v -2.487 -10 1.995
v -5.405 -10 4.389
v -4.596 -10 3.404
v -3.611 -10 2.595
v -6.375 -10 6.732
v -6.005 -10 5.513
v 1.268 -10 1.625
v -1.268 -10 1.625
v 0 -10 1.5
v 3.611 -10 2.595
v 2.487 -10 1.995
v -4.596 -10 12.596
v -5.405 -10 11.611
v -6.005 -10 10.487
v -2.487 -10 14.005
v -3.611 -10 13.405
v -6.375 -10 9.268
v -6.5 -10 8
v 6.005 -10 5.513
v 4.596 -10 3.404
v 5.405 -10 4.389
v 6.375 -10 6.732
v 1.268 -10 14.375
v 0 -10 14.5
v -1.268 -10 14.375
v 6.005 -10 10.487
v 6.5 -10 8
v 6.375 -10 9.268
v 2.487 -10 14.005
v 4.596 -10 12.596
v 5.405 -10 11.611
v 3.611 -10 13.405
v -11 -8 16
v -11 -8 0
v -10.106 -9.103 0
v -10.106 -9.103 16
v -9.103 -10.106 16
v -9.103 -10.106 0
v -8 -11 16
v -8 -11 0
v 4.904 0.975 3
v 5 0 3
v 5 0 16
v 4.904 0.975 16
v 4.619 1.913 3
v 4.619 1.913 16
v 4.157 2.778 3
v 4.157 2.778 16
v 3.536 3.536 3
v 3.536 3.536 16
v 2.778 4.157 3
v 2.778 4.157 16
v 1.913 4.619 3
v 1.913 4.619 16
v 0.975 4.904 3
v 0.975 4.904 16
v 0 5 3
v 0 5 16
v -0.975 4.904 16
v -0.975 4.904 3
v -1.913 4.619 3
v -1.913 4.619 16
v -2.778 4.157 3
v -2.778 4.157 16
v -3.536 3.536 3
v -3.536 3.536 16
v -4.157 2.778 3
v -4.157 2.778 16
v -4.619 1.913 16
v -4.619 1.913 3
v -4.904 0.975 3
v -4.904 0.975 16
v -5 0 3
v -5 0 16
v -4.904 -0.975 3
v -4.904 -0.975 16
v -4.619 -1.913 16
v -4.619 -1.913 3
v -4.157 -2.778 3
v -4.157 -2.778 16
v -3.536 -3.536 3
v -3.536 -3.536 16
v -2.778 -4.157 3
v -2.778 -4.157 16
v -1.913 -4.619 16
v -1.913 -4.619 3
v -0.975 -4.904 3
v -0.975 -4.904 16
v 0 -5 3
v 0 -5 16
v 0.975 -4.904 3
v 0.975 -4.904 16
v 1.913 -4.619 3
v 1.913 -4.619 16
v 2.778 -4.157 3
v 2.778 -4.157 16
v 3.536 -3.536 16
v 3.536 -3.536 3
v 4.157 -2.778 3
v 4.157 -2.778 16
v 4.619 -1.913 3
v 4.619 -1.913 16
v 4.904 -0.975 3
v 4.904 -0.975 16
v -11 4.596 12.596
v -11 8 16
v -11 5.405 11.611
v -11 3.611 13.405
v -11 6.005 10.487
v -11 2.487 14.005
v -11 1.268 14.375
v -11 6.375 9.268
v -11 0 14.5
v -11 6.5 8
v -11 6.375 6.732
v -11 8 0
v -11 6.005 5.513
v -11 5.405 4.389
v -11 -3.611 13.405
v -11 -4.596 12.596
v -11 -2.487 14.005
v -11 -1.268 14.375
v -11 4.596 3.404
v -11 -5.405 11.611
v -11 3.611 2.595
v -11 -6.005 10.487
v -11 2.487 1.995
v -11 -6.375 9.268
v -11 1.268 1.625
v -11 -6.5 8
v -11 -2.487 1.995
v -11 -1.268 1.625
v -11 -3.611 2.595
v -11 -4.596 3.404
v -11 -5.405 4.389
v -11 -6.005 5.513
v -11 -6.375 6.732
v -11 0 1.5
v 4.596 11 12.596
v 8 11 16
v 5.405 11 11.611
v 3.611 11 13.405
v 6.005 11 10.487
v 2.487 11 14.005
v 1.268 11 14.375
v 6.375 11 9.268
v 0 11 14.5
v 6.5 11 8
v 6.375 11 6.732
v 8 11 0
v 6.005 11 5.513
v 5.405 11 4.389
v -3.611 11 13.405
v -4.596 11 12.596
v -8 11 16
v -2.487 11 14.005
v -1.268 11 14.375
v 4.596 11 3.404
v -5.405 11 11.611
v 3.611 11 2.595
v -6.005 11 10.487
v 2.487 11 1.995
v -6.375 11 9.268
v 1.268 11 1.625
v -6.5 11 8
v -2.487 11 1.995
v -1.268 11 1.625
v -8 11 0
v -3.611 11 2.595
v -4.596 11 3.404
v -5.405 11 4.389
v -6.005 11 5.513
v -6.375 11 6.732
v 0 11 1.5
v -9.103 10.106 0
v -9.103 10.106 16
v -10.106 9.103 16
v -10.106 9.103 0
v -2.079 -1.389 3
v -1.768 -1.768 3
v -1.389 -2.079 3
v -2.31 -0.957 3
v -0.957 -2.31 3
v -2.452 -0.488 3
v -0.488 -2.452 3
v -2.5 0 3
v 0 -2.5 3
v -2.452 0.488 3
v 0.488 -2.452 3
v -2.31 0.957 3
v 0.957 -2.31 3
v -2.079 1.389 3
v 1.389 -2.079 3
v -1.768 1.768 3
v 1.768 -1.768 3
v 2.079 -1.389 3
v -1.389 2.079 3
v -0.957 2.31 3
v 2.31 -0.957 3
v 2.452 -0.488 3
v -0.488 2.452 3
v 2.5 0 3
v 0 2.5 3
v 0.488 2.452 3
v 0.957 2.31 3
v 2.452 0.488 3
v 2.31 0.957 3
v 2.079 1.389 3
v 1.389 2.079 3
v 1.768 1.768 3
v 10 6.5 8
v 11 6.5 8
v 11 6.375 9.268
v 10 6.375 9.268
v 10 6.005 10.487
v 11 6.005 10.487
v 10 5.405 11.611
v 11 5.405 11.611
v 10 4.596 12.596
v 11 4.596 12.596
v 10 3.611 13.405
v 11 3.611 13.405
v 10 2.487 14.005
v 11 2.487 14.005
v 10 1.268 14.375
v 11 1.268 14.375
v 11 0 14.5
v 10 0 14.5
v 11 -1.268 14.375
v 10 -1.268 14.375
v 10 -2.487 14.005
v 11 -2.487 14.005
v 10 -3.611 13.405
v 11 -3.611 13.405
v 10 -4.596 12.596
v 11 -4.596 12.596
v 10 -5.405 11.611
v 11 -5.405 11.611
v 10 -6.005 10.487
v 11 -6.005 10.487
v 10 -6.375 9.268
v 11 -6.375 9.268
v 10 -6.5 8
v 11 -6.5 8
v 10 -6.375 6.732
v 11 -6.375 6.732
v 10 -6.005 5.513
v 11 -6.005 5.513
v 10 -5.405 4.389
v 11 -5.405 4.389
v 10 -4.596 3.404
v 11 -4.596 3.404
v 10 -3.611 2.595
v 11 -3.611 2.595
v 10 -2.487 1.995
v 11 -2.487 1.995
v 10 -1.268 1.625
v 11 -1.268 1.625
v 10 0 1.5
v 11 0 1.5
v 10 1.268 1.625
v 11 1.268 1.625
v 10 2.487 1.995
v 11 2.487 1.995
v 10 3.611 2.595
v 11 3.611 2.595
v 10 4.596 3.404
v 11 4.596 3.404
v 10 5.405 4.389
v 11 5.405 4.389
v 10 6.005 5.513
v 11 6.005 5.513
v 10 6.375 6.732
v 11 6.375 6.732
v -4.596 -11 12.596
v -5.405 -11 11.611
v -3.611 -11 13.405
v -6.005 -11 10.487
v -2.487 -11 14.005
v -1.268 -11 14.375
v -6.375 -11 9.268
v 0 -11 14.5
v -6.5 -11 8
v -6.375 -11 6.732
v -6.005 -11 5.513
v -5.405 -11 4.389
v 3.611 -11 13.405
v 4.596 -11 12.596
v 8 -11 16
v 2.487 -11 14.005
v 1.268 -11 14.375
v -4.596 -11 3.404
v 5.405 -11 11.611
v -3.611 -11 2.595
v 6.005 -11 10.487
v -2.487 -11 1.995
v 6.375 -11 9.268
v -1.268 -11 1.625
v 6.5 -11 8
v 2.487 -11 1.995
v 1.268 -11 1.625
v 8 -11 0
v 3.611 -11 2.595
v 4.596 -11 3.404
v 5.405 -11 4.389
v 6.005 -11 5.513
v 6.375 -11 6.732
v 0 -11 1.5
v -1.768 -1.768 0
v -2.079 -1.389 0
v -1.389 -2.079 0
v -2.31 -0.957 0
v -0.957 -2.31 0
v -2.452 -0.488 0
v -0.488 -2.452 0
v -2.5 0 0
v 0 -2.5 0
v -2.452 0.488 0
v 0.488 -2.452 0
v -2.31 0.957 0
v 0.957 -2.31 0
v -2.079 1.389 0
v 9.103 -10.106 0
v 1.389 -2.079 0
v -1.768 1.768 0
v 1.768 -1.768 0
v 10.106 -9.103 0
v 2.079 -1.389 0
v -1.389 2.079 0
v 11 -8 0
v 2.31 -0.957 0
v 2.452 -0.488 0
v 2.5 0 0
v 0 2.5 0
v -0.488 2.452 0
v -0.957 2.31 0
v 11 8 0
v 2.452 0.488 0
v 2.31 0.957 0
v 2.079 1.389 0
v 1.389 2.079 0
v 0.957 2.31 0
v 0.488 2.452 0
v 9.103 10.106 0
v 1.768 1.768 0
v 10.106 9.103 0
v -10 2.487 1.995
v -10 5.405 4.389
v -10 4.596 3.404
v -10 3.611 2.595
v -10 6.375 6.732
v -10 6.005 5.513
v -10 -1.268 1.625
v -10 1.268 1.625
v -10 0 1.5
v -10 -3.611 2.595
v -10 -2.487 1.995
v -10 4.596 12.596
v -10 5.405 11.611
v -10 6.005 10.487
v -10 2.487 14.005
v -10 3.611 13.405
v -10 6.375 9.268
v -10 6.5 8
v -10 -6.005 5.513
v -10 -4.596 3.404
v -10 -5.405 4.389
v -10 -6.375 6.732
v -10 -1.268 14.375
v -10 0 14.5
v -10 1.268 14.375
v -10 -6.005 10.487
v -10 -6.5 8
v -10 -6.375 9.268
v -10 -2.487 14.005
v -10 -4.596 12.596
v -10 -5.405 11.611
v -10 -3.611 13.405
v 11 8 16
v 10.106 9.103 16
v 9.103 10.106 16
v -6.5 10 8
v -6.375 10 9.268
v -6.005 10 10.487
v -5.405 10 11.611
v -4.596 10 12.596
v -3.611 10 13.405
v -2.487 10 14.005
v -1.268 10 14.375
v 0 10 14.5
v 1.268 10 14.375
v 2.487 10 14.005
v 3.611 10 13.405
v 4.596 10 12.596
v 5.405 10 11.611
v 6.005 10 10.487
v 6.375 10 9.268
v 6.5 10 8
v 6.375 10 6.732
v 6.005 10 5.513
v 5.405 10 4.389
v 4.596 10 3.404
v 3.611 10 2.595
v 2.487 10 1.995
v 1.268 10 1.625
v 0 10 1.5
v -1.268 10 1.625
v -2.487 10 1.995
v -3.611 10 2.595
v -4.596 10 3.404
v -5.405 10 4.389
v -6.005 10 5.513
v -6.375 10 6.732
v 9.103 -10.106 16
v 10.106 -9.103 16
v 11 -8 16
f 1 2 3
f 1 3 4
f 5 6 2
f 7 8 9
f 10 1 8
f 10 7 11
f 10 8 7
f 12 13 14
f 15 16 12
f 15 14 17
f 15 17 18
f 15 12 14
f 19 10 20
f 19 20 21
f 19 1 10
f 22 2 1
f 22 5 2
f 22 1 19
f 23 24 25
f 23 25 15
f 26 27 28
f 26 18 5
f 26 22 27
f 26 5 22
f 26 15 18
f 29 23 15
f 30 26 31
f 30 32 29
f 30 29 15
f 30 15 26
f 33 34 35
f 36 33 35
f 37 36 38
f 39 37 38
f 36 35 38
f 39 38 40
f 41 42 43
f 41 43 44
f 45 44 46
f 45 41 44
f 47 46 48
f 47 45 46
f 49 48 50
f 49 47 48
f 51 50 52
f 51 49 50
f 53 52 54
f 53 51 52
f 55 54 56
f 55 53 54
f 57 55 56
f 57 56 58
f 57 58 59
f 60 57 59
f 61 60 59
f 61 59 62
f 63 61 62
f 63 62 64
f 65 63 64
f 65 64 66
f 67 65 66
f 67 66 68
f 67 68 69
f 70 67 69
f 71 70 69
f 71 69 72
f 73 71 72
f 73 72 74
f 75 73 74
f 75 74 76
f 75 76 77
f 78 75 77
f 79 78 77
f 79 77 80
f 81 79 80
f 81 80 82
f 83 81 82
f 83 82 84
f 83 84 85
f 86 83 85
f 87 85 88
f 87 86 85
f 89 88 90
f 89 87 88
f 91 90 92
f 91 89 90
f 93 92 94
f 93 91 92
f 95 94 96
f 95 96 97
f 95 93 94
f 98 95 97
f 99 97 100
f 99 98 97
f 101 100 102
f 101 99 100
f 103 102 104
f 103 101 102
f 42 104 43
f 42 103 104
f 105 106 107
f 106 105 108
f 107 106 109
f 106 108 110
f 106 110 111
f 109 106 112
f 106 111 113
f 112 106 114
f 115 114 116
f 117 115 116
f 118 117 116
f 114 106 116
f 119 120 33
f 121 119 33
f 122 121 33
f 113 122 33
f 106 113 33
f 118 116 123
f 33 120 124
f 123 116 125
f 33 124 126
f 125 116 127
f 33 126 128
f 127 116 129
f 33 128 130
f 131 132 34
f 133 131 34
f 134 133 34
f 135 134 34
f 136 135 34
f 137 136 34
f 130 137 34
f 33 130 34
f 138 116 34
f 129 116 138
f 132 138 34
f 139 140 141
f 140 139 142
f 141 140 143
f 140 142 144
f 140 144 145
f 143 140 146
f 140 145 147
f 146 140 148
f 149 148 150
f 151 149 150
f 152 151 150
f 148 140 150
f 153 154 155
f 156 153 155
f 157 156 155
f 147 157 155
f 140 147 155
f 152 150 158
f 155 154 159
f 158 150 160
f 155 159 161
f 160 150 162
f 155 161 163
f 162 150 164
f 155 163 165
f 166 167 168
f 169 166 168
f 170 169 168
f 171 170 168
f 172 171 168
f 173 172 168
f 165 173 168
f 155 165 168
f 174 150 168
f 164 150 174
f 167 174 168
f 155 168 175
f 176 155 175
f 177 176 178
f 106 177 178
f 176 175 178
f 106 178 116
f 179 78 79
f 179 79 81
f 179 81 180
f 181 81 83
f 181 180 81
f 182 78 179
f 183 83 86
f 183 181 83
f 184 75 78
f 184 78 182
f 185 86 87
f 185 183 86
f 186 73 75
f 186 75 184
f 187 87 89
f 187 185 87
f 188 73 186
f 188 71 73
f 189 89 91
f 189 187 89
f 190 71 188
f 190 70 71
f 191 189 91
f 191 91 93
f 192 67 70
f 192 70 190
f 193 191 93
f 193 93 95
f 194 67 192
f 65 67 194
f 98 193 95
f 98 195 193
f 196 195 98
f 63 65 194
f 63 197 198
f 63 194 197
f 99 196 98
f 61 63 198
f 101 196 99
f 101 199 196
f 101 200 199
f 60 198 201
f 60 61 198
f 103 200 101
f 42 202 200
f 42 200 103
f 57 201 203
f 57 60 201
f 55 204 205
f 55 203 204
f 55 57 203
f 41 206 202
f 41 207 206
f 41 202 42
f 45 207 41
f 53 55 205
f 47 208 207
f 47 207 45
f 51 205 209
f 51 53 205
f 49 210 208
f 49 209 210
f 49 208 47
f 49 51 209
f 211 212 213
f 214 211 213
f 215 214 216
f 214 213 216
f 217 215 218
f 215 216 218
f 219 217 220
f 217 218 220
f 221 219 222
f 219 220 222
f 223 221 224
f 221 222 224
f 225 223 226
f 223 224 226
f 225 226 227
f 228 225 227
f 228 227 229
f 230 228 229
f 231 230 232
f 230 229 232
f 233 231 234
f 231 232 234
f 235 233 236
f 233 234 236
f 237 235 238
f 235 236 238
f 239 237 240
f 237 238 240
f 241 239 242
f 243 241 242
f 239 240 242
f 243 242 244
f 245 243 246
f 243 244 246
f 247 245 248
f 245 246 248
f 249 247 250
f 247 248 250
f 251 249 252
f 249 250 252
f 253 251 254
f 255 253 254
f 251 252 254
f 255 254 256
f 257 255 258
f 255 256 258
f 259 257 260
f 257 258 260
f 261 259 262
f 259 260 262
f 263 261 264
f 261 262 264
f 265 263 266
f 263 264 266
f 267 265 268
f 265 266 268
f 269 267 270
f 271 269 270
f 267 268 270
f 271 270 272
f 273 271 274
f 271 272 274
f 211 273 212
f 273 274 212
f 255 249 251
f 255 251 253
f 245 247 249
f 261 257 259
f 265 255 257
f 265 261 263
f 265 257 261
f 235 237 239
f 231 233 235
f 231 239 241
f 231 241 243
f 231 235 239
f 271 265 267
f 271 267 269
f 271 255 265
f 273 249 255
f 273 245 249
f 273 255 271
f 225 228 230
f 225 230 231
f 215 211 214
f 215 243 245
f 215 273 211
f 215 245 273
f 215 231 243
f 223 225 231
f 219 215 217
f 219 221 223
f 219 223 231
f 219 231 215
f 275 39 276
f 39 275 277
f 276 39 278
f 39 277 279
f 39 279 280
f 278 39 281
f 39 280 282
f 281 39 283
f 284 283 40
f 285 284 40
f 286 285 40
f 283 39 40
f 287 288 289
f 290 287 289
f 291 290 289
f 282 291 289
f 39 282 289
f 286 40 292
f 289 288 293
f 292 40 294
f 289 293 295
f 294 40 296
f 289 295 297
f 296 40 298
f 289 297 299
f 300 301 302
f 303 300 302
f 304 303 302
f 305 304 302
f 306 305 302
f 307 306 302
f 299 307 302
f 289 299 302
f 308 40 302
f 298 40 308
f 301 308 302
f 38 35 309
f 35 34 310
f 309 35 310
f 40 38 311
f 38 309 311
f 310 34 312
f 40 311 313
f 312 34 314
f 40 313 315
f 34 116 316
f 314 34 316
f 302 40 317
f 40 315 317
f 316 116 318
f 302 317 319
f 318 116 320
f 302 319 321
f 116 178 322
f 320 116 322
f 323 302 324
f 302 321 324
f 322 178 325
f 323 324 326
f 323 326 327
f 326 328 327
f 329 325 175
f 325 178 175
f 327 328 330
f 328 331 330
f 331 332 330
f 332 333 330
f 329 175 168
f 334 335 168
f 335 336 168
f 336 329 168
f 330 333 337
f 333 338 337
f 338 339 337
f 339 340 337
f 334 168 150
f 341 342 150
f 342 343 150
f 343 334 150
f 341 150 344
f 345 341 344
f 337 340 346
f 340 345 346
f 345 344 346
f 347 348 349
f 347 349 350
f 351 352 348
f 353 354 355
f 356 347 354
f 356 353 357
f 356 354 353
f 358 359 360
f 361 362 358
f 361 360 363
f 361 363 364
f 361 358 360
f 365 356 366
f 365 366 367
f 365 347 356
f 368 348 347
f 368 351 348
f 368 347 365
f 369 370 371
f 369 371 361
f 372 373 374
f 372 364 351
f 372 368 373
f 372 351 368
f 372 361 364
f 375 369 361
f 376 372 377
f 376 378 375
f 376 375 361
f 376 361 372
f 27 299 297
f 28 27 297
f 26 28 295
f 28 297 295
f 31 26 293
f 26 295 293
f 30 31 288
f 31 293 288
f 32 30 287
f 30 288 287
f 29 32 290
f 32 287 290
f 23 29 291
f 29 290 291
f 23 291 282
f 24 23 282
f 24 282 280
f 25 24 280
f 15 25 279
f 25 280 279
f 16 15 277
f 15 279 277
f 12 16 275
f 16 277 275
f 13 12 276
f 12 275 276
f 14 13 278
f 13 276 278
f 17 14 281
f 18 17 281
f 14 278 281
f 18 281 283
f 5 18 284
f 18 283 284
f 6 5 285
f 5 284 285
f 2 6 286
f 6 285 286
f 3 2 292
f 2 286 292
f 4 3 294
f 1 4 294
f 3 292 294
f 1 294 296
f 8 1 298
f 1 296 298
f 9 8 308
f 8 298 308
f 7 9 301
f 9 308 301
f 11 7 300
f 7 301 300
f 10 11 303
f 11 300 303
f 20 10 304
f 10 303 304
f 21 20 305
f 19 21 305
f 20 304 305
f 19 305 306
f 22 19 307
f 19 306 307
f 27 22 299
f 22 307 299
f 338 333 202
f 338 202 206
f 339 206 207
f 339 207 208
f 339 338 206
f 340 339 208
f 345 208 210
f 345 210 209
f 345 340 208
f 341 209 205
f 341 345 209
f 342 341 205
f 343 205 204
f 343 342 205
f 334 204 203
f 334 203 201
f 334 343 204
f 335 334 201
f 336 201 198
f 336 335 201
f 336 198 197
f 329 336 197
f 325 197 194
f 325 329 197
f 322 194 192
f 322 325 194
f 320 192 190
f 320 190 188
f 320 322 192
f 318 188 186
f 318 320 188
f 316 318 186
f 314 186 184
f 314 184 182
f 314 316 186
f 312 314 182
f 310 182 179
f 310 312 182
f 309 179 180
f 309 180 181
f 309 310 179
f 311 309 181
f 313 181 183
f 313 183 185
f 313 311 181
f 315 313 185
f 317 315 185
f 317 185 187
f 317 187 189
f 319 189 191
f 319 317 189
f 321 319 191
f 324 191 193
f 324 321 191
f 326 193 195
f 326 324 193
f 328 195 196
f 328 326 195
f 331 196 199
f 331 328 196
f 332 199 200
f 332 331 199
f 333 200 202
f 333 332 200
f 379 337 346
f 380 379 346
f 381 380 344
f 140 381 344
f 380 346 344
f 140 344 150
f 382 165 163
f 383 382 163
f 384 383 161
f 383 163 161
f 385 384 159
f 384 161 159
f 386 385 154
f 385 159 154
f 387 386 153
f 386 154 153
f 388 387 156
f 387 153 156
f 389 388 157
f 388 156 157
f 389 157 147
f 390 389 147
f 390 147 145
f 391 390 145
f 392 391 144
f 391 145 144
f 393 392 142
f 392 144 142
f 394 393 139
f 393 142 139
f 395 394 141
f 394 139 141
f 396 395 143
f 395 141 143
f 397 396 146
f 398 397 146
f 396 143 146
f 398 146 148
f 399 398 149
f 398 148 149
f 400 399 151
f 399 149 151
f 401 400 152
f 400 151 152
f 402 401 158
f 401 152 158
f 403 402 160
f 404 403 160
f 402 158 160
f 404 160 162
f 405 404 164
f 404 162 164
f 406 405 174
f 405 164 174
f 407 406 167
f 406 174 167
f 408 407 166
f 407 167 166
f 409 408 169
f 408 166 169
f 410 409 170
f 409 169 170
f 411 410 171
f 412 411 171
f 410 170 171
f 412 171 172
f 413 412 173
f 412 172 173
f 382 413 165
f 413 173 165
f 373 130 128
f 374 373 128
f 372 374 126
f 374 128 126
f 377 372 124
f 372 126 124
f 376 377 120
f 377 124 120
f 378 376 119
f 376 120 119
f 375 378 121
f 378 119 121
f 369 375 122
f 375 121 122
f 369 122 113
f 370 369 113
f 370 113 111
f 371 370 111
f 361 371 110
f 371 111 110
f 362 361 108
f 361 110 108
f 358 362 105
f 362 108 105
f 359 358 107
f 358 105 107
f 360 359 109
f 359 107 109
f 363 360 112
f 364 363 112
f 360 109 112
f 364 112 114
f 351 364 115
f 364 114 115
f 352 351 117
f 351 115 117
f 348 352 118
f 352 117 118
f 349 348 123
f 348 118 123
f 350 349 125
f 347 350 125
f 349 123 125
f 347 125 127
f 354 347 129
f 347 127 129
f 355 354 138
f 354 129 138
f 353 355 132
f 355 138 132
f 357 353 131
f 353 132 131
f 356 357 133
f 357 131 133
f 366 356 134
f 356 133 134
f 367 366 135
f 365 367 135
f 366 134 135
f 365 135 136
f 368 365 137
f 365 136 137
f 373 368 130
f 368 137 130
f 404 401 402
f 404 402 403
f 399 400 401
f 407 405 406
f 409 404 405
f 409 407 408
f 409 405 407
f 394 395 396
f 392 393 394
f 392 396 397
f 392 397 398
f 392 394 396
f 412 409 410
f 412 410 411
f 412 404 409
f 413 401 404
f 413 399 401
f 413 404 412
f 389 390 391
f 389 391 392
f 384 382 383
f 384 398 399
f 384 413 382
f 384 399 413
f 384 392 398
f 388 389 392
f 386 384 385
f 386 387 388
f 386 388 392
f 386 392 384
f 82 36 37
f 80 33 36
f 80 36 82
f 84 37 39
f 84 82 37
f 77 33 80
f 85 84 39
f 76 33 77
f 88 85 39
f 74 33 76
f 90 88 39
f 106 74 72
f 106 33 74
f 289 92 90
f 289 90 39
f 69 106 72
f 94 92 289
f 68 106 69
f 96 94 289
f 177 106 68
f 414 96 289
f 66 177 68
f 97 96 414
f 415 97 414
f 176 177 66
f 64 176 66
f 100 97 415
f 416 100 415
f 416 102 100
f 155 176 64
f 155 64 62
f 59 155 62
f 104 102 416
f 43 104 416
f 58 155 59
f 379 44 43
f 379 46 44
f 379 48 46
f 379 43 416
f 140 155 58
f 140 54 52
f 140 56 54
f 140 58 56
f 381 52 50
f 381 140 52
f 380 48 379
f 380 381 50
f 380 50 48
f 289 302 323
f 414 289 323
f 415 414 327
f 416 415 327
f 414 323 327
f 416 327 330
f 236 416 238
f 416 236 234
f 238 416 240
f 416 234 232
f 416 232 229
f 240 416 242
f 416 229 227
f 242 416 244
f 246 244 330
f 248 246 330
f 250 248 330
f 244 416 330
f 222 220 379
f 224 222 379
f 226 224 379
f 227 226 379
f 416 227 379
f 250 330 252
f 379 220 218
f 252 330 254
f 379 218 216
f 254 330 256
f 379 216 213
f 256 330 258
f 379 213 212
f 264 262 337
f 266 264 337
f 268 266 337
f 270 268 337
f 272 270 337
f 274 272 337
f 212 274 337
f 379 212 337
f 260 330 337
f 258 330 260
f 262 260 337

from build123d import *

# Parameters (mm, degrees)
F0_R            = 5
F2_DEPTH        = 16
F3_R            = 6.5
F4_DEPTH        = 1
F4_COPIES_COUNT = 4
F0_R_2          = 2.5
F5_DEPTH        = 3


# Not quite as in the source:
# - a pattern or mirror of a feature is missing from the dataset's text; its kind, count and spacing are read off the source's solid


with BuildPart() as f2:
    # F0 (on Top) → F2 (new body)
    with BuildSketch(Plane.XY):
        with BuildLine():
            Line((11, -8), (11, 8))
            ThreePointArc((11, 8), (9.6176920308, 9.6176920308), (8, 11))
            Line((8, 11), (-8, 11))
            ThreePointArc((-8, 11), (-9.6176920308, 9.6176920308), (-11, 8))
            Line((-11, 8), (-11, -8))
            ThreePointArc((-11, -8), (-9.6176920308, -9.6176920308), (-8, -11))
            Line((-8, -11), (8, -11))
            ThreePointArc((8, -11), (9.6176920308, -9.6176920308), (11, -8))
        make_face()
        Circle(F0_R, mode=Mode.SUBTRACT)
    extrude(amount=F2_DEPTH)

    # F3 (on face) → F4 (cut)
    with BuildSketch(Plane.XZ.offset(11)):
        with Locations((0, 8)):
            Circle(F3_R)
    f4 = extrude(amount=-F4_DEPTH, mode=Mode.SUBTRACT)

    # F4_copies: F4 ×4 about axis
    f4_copies_axis = Axis((0, 0, 0), (0, 0, 1))
    for i in range(1, F4_COPIES_COUNT):
        add(f4.rotate(f4_copies_axis, i * 360 / F4_COPIES_COUNT), mode=Mode.SUBTRACT)

    # F0 (on Top) → F5 (join)
    with BuildSketch(Plane.XY):
        Circle(F0_R)
        Circle(F0_R_2, mode=Mode.SUBTRACT)
    extrude(amount=F5_DEPTH)


solid = f2.part
